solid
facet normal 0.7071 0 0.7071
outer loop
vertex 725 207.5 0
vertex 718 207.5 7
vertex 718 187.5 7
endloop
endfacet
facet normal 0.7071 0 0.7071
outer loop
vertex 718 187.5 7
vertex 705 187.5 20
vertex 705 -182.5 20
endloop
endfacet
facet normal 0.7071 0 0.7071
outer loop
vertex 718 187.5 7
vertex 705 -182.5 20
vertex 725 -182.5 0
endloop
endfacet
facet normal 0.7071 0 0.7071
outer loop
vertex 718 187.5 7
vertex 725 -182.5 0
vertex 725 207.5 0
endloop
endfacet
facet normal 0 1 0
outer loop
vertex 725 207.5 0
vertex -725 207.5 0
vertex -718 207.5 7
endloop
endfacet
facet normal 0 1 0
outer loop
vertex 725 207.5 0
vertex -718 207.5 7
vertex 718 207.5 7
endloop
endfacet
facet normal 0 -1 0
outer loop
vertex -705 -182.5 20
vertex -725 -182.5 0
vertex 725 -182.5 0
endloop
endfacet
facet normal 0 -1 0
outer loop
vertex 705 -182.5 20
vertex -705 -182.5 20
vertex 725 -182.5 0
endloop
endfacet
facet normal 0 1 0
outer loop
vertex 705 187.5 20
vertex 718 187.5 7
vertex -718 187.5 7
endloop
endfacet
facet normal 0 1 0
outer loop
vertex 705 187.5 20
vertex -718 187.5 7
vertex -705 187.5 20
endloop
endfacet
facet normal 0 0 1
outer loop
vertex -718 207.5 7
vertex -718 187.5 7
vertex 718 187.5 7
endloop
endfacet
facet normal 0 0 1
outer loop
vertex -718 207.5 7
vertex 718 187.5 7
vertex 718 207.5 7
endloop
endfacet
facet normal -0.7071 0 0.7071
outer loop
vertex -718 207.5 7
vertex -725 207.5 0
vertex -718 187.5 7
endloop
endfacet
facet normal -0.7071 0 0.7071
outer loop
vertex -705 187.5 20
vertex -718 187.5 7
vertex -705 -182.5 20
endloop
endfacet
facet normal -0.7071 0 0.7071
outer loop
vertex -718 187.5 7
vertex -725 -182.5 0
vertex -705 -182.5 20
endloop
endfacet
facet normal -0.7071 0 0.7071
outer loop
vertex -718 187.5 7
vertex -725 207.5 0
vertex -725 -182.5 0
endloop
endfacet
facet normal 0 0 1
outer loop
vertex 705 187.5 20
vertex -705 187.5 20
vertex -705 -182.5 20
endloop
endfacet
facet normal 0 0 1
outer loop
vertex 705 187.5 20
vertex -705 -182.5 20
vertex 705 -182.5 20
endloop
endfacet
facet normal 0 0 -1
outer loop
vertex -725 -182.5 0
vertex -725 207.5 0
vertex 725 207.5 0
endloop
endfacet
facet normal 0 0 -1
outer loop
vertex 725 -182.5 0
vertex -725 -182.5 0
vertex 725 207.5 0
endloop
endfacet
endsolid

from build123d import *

# Parameters (mm, degrees)
F0_W     = 1450
F0_H     = 415
F1_DEPTH = 20
F2_W     = 20
F2_H     = 13
F3_DEPTH = 1450
F5_DEPTH = 510
F6_W     = 1450
F6_H     = 25
F7_DEPTH = 25


with BuildPart() as f1:
    # F0 (on Top) → F1 (new body)
    with BuildSketch(Plane.XY):
        Rectangle(F0_W, F0_H)
    extrude(amount=F1_DEPTH)

    # F2 (on face) → F3 (cut)
    with BuildSketch(Plane.YZ.offset(725)):
        with Locations((197.5, 13.5)):
            Rectangle(F2_W, F2_H)
    extrude(amount=-F3_DEPTH, mode=Mode.SUBTRACT)

    # F4 (on face) → F5 (cut)
    with BuildSketch(Plane.XZ.offset(207.5)):
        Polygon((725, 0), (725, 20), (705, 20), align=None)
        Polygon((-725, 20), (-725, 0), (-705, 20), align=None)
    extrude(amount=-F5_DEPTH, mode=Mode.SUBTRACT)

    # F6 (on face) → F7 (cut)
    with BuildSketch(Plane(origin=(0, 0, 0), x_dir=(1, 0, 0), z_dir=(0, 0, -1))):
        with Locations((0, 195)):
            Rectangle(F6_W, F6_H)
    extrude(amount=-F7_DEPTH, mode=Mode.SUBTRACT)


solid = f1.part
